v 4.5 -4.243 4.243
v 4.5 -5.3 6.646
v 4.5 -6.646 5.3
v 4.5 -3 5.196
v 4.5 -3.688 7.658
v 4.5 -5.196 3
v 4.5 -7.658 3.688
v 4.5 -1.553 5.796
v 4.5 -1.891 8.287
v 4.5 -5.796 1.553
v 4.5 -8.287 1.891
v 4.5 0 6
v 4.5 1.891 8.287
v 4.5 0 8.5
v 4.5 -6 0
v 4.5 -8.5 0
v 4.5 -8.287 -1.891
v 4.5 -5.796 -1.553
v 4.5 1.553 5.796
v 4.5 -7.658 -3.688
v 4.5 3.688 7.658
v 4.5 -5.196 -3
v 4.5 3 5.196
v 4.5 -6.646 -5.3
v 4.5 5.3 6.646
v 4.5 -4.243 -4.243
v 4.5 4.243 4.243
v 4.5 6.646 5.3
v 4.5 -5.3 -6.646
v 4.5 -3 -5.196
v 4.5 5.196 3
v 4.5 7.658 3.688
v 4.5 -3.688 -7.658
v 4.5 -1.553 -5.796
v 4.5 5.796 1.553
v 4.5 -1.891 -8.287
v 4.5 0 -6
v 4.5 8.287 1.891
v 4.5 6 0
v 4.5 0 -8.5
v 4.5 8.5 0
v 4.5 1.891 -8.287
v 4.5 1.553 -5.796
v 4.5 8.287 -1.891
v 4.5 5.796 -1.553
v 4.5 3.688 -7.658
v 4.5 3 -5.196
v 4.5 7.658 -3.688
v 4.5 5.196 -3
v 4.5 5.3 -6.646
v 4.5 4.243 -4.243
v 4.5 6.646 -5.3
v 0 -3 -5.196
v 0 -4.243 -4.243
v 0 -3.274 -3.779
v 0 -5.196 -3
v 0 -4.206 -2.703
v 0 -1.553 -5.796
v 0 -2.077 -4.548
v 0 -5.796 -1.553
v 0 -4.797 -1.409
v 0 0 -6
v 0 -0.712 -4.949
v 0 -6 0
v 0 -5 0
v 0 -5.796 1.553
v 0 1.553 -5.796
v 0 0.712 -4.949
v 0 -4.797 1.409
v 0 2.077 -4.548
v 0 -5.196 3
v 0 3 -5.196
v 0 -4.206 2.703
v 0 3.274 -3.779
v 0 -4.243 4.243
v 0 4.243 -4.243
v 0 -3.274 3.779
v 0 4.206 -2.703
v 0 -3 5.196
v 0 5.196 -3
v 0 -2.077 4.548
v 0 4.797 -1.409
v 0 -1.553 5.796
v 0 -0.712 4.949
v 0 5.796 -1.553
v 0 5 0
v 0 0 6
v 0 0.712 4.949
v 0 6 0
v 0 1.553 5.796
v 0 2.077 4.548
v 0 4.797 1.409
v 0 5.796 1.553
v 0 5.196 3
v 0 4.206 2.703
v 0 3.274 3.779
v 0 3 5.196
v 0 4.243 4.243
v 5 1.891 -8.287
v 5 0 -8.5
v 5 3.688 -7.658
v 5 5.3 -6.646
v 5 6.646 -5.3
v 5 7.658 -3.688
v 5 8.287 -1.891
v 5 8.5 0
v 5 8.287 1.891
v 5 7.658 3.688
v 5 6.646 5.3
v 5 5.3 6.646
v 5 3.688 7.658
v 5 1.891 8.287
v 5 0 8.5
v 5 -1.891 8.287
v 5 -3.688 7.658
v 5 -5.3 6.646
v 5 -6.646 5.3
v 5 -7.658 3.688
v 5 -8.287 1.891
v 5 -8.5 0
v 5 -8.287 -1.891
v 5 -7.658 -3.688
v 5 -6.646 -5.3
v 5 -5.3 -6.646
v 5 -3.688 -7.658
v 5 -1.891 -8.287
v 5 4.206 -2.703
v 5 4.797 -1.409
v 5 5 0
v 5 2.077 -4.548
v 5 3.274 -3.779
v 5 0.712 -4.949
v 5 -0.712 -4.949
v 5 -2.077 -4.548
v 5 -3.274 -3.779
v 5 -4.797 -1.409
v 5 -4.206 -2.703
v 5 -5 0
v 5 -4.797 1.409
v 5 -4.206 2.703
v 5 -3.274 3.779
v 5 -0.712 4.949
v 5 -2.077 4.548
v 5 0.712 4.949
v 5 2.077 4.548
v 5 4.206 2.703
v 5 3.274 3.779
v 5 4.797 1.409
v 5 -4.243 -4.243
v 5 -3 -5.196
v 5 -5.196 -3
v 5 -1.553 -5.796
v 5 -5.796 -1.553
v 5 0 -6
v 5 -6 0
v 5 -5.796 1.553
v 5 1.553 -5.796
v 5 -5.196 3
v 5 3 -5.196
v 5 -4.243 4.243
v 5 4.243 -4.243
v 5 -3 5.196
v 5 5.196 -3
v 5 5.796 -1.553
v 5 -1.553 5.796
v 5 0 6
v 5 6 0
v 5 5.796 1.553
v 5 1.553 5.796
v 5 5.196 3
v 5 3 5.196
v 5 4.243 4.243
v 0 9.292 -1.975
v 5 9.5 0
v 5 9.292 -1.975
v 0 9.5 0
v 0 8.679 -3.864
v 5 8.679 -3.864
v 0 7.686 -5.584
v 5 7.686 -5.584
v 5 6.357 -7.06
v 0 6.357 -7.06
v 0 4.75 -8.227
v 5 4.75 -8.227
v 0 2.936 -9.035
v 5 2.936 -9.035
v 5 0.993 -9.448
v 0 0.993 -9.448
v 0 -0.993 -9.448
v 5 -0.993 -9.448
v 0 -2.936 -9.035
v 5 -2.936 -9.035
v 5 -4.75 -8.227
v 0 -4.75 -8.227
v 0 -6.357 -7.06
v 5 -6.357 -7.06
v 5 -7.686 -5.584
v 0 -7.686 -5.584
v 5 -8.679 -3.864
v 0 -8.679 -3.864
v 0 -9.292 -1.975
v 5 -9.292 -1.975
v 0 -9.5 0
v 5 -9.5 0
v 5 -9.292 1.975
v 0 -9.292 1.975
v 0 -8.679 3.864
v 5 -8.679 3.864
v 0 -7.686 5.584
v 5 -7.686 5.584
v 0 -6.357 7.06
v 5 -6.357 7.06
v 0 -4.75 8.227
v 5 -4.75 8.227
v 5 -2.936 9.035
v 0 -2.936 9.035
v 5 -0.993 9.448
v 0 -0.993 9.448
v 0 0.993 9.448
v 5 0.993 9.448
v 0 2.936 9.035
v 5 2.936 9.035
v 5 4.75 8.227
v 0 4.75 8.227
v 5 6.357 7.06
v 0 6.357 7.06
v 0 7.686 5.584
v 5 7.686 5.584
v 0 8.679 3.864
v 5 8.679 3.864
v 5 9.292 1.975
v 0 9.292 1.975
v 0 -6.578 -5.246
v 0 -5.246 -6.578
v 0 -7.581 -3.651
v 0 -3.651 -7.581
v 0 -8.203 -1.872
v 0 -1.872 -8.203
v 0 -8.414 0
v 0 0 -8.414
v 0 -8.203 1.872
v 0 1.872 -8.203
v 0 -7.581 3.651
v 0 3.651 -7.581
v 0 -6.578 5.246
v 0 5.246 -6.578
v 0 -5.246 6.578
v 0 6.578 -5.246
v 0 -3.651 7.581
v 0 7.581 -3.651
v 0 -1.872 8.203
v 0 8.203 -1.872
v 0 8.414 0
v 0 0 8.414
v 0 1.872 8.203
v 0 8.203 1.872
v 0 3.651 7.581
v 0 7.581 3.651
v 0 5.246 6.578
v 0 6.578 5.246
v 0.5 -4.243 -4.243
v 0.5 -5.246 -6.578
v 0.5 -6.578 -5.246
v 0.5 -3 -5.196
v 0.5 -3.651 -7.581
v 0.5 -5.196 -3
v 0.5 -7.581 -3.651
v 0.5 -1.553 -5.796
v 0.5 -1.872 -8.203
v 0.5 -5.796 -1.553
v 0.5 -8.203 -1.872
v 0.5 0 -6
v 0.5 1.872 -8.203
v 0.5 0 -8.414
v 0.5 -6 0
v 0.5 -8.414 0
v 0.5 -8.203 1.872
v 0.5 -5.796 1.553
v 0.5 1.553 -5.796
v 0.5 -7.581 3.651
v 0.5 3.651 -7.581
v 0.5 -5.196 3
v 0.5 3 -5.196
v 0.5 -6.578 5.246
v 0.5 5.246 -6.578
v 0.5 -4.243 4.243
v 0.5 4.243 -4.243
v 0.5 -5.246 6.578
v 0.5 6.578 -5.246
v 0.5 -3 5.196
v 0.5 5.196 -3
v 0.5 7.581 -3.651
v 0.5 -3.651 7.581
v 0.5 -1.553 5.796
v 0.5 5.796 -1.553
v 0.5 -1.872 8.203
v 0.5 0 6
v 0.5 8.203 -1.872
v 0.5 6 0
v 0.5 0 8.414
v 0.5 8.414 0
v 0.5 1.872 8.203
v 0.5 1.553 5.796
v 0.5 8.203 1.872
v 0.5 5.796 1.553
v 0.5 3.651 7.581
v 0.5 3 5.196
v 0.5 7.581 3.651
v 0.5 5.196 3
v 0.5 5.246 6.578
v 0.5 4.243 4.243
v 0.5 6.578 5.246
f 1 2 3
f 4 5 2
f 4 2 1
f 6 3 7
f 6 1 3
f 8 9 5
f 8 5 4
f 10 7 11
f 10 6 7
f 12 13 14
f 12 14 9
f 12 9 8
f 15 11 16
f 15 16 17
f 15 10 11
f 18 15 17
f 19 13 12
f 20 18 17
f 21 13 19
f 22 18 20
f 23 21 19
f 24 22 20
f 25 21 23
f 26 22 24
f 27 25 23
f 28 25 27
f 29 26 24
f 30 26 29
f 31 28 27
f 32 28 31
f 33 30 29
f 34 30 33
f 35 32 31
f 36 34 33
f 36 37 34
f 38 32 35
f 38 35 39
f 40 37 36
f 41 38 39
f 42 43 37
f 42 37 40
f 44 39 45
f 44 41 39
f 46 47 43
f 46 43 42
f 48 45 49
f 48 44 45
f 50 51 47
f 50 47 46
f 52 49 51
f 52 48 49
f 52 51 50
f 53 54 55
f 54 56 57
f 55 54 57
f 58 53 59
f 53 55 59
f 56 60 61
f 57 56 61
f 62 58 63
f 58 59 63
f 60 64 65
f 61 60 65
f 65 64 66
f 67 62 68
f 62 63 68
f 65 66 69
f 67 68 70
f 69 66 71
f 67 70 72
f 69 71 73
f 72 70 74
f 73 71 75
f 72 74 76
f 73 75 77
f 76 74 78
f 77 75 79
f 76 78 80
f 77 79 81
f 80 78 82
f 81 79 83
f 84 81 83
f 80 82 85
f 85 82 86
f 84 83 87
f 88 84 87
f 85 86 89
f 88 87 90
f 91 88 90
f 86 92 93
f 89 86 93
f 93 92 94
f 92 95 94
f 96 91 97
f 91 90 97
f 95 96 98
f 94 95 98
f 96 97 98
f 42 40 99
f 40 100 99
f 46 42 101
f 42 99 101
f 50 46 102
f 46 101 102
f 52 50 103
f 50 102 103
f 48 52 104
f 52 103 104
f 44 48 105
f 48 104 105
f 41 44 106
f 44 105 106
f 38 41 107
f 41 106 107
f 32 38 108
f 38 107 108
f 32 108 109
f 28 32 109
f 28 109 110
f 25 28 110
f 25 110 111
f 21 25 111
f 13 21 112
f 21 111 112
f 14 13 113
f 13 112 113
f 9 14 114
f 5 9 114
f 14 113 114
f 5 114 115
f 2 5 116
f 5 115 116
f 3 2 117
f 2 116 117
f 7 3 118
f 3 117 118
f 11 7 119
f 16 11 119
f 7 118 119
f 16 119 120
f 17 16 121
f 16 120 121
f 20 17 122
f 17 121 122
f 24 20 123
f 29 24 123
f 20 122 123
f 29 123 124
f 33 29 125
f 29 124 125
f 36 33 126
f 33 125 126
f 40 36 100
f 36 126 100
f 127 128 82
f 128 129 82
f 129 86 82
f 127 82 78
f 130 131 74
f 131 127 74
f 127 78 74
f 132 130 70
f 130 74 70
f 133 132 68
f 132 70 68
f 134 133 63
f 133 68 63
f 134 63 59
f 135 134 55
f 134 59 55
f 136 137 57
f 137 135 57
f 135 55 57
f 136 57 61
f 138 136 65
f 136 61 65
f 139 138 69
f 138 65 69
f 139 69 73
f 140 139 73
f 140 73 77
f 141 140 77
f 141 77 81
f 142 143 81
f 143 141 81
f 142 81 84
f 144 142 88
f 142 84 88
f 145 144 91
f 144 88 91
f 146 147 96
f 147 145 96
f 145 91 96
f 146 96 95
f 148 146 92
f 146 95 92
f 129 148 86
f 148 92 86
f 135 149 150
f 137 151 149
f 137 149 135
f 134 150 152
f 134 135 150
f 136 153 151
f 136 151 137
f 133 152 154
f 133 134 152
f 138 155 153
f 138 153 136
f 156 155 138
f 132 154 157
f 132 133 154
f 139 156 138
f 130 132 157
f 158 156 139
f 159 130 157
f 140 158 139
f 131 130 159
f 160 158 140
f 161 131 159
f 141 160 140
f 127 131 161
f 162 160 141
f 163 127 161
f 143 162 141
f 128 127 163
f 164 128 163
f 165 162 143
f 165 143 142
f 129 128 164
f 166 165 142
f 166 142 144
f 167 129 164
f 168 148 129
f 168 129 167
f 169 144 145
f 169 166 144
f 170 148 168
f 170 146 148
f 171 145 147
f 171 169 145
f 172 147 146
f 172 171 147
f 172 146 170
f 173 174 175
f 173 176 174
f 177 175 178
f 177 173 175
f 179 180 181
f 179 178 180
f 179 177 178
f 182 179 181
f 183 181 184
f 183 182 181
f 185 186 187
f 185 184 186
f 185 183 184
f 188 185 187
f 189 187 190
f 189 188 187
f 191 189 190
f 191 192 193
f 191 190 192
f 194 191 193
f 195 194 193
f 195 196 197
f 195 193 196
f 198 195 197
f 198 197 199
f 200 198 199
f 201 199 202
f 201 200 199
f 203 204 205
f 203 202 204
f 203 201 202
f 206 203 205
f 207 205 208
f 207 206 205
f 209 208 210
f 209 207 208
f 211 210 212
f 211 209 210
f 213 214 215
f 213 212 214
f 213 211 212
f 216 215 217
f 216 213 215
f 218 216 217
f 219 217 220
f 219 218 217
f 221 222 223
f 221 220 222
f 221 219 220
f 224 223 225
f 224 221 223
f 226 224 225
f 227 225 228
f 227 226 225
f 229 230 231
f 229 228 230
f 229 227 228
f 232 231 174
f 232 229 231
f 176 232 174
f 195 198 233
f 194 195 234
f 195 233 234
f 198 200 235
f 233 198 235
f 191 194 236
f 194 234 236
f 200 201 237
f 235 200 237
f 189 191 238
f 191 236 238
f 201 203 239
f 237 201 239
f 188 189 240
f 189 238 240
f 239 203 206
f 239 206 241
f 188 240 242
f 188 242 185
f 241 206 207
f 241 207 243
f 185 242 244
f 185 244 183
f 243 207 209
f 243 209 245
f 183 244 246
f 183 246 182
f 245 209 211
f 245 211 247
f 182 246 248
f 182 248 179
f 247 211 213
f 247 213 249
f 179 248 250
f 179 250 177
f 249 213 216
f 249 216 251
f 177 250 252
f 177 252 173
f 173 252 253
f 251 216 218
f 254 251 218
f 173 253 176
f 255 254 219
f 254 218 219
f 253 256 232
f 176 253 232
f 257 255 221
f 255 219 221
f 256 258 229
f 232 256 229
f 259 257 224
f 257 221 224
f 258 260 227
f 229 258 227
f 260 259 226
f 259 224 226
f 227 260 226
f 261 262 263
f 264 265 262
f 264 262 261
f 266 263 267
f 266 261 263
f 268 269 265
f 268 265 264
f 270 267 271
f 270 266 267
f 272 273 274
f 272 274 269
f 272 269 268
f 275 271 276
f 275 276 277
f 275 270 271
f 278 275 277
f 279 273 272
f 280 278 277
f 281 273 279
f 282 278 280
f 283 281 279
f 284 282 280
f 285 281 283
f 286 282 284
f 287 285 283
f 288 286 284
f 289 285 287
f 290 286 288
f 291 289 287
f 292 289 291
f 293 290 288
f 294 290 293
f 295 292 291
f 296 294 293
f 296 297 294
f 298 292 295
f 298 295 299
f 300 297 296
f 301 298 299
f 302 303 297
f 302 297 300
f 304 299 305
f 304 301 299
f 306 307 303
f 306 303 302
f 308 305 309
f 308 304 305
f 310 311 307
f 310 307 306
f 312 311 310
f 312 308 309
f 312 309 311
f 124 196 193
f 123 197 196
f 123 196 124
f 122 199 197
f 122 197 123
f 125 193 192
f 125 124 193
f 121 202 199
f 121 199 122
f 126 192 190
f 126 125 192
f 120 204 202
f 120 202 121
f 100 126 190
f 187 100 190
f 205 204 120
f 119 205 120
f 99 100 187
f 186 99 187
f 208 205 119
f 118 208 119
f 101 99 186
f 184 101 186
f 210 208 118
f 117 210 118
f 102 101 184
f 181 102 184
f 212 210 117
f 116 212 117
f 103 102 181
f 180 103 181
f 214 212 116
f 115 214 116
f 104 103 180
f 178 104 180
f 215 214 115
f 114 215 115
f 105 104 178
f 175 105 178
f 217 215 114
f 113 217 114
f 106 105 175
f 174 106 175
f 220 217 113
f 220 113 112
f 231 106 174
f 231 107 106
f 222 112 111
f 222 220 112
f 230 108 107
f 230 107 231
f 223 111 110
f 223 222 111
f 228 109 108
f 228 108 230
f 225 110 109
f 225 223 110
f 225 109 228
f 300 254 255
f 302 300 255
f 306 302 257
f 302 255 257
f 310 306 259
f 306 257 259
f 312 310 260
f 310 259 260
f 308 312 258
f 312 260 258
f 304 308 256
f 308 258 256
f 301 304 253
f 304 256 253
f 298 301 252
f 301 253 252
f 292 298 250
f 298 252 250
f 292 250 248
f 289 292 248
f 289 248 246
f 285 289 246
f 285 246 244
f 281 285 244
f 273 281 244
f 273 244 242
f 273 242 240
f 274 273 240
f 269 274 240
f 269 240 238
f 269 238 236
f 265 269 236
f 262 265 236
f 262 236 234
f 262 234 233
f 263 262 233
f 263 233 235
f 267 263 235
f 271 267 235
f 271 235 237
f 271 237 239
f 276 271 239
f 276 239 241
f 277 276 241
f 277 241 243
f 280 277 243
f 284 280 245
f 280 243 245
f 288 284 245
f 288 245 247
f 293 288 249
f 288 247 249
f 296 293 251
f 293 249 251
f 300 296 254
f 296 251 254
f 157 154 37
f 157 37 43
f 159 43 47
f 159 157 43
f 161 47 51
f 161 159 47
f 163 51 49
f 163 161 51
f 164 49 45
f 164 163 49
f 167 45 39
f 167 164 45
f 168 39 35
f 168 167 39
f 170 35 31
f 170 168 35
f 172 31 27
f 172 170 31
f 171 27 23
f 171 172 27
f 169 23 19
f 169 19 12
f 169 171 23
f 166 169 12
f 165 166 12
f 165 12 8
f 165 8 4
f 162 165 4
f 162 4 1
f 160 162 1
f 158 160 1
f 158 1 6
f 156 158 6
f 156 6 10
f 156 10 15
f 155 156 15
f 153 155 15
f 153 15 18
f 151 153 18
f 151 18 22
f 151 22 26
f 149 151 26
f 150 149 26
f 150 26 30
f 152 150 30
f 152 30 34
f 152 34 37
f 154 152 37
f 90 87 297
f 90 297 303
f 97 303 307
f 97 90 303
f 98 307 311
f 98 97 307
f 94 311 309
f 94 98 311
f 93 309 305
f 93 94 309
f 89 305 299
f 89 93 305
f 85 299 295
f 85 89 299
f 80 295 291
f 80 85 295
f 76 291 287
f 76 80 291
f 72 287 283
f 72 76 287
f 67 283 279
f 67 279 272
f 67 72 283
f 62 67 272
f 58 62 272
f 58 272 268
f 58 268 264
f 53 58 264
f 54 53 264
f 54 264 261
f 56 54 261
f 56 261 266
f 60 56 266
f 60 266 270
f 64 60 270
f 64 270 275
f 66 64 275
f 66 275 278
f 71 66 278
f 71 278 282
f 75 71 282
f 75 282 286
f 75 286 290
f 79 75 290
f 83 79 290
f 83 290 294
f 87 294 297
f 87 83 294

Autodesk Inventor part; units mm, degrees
ref_plane "YZ Plane" through (0, 0, 0) normal (1, 0, 0) x (0, 1, 0)
ref_plane "XZ Plane" through (0, 0, 0) normal (0, 1, 0) x (-1, 0, 0)
ref_plane "XY Plane" through (0, 0, 0) normal (0, 0, 1) x (1, 0, 0)
sketch "Эскиз6" plane through (0, 0, 0) normal (1, 0, 0) x (0, 1, 0)
  circle A0 centre (0, 0) radius 9.5
  circle A1 centre (0, 0) radius 5
  dimension "d13" = 19
  dimension "d14" = 10
extrude "Выдавливание5" add sketch "Эскиз6" along normal blind 5
sketch "Эскиз7" plane through (5, 0, 0) normal (1, 0, 0) x (0, 0, -1)
  circle A0 centre (0, 0) radius 6
  circle A1 centre (0, 0) radius 8.5
  dimension "d17" = 12
  dimension "d18" = 17
extrude "Выдавливание6" cut sketch "Эскиз7" against normal blind 0.5
sketch "Эскиз8" plane through (0, 0, 0) normal (-1, 0, 0) x (0, 0, 1)
  circle A0 centre (0, 0) radius 6
  circle A1 centre (0, 0) radius 8.4142
extrude "Выдавливание7" cut sketch "Эскиз8" against normal blind 0.5
properties part number "подшипник для ведущих шестеренок" material "Титан"
